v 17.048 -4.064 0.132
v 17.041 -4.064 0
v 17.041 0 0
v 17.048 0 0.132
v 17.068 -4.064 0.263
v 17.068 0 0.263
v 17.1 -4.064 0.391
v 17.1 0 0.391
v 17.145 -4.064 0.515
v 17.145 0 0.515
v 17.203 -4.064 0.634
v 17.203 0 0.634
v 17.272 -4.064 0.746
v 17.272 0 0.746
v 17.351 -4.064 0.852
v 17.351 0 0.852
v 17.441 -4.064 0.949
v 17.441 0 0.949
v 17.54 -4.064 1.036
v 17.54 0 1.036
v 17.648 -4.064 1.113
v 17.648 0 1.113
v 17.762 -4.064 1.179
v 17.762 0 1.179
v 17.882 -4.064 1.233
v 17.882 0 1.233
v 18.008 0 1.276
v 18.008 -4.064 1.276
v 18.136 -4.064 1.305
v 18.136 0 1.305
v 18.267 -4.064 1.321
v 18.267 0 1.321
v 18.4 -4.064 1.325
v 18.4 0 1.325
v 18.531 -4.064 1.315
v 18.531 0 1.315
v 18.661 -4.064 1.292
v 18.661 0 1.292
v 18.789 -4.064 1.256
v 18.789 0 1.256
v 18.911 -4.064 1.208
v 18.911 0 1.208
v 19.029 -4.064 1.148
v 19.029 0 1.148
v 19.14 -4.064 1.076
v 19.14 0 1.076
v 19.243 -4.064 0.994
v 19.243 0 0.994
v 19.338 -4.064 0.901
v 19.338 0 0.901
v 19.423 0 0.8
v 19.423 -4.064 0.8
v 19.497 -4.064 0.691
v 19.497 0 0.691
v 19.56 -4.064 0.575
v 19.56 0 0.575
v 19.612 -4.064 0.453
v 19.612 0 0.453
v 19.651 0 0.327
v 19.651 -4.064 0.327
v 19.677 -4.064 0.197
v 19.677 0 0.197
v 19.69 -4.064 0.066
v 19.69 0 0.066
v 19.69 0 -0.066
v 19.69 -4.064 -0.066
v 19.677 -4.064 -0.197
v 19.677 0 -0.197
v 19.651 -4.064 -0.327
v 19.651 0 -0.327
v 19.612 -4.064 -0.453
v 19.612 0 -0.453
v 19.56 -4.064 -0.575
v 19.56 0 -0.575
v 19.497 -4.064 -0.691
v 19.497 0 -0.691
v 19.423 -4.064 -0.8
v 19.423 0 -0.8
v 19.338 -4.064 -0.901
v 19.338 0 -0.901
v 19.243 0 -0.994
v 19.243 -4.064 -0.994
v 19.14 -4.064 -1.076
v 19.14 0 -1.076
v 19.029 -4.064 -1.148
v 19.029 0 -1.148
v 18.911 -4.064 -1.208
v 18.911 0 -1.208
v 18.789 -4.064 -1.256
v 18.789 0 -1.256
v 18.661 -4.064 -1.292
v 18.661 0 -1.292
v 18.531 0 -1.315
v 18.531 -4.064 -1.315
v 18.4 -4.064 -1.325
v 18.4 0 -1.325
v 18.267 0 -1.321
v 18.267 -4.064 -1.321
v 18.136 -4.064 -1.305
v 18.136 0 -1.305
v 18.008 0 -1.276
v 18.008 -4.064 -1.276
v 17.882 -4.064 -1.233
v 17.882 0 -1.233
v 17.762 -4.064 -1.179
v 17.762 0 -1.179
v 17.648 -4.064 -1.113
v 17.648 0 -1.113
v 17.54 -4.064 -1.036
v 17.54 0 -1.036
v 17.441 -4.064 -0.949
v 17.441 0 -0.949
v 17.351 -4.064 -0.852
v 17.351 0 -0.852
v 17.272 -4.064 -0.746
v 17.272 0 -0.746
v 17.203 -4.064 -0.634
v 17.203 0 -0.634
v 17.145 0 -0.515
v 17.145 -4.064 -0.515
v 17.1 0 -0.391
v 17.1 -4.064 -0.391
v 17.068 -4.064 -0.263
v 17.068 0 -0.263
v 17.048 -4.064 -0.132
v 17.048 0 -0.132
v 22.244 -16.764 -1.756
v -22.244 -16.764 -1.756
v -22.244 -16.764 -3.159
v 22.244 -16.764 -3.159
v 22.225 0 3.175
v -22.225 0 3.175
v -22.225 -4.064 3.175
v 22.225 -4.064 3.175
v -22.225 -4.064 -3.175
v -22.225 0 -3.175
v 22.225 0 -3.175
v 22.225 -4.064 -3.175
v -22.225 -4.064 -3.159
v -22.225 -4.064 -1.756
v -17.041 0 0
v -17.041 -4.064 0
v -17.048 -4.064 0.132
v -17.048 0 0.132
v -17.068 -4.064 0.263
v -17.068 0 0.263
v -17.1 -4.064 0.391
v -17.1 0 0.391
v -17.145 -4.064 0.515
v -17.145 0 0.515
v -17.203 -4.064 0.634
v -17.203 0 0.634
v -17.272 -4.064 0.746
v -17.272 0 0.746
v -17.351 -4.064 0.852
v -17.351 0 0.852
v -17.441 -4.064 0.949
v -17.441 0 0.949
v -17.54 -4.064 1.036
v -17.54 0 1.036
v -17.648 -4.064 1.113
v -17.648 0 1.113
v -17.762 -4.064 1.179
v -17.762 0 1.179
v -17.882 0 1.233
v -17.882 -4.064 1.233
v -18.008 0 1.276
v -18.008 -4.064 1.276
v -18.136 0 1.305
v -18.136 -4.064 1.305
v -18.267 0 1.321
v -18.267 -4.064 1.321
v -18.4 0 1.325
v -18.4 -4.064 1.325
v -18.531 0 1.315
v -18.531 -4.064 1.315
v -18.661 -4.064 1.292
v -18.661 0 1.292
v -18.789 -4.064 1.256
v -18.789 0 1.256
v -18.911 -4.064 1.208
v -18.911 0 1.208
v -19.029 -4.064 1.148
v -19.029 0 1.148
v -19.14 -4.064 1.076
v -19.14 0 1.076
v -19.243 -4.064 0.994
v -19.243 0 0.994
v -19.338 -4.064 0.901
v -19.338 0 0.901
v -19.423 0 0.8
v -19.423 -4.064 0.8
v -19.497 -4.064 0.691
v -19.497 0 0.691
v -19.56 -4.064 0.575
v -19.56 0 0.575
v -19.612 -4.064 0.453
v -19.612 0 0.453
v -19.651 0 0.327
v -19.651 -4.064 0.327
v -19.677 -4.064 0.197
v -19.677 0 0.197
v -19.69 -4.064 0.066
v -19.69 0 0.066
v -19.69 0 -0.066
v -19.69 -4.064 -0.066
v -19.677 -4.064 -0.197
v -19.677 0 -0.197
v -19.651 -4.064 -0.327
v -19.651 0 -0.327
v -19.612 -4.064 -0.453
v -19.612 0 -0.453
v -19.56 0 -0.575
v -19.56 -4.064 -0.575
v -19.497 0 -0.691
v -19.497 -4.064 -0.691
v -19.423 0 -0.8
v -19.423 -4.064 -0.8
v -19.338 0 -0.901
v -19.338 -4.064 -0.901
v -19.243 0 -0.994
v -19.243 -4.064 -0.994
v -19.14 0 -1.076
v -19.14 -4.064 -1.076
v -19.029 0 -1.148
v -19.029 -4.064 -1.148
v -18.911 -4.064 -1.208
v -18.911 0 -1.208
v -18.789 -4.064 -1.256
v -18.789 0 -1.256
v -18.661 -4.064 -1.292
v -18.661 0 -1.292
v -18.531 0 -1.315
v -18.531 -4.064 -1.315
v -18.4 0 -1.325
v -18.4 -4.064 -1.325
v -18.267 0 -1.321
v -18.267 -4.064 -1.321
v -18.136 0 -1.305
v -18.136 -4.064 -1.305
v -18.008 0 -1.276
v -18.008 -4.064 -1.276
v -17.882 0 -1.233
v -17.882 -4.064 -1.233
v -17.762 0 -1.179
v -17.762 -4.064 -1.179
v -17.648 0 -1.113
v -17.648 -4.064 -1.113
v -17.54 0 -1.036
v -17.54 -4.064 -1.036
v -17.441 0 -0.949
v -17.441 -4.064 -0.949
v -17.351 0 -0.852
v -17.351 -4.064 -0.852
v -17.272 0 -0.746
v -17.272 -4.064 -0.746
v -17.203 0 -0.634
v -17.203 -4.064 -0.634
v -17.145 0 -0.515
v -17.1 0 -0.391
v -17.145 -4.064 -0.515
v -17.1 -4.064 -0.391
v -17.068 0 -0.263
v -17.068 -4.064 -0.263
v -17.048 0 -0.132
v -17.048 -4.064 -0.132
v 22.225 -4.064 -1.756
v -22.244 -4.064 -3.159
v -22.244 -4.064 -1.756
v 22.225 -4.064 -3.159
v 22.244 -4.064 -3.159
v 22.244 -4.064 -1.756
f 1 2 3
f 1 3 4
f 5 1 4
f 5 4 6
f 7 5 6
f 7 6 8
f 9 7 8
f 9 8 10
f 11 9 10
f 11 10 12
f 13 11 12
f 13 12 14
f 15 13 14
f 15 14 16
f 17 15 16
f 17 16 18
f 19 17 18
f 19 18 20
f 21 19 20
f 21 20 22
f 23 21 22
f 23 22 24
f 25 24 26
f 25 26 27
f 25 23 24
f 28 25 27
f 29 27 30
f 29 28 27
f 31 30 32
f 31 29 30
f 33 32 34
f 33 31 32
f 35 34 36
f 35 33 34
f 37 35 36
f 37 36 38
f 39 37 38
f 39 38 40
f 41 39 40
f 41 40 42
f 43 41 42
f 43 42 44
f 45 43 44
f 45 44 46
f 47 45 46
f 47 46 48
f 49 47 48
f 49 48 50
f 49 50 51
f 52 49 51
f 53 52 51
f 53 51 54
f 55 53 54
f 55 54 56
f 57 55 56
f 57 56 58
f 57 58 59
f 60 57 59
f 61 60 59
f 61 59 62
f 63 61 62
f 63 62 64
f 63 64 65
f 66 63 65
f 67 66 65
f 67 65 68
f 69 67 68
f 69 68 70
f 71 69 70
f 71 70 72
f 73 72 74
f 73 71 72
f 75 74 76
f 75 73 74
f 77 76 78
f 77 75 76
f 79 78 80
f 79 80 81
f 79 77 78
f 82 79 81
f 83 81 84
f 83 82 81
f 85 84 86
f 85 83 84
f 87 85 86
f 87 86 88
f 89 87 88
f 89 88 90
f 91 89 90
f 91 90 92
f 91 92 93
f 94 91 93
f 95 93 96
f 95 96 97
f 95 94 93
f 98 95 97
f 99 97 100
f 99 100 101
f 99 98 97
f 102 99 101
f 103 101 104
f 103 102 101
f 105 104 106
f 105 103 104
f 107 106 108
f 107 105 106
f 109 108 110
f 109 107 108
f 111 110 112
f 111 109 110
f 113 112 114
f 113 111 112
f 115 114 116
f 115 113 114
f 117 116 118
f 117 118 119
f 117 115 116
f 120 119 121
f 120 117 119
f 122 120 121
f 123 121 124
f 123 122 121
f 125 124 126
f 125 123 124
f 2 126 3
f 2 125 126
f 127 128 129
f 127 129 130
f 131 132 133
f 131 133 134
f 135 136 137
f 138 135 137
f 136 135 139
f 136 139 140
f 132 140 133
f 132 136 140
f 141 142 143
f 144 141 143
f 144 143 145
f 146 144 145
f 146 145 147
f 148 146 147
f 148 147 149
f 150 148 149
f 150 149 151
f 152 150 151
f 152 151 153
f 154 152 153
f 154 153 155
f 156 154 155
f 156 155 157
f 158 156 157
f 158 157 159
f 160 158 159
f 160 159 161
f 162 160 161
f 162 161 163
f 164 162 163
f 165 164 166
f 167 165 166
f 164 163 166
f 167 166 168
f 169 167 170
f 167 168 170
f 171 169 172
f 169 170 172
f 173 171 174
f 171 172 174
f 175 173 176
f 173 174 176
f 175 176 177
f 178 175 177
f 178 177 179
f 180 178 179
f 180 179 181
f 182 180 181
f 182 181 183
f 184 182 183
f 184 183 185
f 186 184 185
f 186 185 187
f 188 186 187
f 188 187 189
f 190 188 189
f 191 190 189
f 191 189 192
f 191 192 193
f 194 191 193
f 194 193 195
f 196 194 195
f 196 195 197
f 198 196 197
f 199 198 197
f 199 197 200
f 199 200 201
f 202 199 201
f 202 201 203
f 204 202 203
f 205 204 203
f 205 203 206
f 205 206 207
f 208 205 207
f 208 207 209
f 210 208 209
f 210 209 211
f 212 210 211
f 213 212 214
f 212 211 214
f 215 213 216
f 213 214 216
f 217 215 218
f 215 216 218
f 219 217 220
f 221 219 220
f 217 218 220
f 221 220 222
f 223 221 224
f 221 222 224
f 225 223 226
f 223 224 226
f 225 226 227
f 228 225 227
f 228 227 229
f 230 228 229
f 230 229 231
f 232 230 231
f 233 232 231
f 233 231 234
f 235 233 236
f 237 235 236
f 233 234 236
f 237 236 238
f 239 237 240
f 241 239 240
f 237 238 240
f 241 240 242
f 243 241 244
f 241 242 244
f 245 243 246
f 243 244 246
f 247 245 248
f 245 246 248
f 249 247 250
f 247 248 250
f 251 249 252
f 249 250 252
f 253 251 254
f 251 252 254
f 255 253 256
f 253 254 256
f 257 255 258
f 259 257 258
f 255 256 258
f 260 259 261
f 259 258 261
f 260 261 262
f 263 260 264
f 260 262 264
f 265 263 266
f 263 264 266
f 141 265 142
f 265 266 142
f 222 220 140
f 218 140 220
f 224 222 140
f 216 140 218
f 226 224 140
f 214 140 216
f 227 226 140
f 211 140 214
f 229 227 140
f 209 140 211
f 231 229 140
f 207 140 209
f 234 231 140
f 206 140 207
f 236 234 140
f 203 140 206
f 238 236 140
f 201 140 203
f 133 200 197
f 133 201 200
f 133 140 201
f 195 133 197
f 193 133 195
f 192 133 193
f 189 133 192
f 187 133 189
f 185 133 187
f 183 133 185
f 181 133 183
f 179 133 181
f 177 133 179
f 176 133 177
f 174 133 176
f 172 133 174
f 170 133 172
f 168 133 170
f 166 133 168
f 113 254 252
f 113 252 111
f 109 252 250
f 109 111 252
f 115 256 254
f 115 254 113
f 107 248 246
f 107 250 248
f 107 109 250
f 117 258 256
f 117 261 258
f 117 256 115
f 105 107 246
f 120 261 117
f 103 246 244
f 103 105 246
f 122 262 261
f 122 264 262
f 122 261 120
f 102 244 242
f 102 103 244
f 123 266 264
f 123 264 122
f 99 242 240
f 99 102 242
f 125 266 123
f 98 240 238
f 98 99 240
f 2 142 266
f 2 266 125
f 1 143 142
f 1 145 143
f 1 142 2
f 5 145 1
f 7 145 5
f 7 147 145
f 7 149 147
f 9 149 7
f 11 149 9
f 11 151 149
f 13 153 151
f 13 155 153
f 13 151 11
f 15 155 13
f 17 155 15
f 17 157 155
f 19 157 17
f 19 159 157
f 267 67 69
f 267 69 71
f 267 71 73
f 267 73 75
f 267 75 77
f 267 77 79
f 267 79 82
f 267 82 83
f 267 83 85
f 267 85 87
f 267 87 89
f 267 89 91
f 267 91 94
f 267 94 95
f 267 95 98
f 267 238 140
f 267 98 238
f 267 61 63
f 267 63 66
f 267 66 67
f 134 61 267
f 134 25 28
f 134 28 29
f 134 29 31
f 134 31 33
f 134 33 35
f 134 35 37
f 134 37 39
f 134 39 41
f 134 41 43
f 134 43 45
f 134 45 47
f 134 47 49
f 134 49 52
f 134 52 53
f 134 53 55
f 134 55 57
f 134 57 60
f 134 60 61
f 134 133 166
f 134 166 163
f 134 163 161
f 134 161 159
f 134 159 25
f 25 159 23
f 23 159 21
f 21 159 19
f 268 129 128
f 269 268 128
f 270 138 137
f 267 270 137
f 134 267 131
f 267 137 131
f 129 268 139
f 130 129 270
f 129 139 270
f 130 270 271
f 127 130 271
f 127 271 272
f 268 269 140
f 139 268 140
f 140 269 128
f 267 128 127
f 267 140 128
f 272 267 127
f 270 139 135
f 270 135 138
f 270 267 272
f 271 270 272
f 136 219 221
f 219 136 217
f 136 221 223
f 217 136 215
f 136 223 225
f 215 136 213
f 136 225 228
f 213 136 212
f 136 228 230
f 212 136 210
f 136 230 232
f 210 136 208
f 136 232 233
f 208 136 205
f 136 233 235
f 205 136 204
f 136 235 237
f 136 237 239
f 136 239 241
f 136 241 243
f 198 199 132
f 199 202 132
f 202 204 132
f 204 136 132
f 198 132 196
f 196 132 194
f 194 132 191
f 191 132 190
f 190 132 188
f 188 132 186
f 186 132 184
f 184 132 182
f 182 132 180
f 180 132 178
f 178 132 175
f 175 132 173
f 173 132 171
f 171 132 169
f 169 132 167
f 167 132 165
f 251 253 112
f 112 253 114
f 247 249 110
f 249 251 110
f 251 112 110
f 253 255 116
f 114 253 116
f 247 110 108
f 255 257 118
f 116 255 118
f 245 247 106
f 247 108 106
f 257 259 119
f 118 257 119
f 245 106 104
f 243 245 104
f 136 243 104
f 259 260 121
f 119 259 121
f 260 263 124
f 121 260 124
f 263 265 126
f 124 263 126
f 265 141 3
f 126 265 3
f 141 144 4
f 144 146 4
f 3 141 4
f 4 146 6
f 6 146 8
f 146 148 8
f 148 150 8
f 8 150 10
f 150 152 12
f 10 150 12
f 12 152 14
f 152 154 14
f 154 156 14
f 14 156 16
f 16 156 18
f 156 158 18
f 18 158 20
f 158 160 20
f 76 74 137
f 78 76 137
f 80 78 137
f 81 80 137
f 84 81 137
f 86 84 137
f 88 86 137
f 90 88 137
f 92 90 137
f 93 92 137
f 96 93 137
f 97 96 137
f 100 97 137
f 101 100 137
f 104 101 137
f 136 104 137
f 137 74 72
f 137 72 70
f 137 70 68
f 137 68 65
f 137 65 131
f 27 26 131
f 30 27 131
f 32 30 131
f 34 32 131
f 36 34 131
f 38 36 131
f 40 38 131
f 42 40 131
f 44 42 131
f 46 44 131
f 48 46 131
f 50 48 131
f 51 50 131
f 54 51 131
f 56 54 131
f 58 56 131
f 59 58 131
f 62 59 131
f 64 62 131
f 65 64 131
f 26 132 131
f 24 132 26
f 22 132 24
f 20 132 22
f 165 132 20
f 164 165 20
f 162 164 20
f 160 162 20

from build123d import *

# Parameters (mm, degrees)
F0_W     = 44.45
F0_H     = 6.35
F1_DEPTH = 4.064
F2_R     = 1.325099
F3_DEPTH = 25.4
F5_DEPTH = 25.4
F7_W     = 44.487826
F7_H     = 1.40328
F8_DEPTH = 12.7


with BuildPart() as f1:
    # F0 (on Front) → F1 (new body)
    with BuildSketch(Plane.XZ):
        Rectangle(F0_W, F0_H)
    extrude(amount=F1_DEPTH)

    # F2 (on face) → F3 (cut)
    with BuildSketch(Plane.XZ.offset(4.064)):
        with Locations((-18.36648, 0)):
            Circle(F2_R)
    extrude(amount=-F3_DEPTH, mode=Mode.SUBTRACT)

    # F2 (on face) → F5 (cut)
    with BuildSketch(Plane.XZ.offset(4.064)):
        with Locations((-18.36648, 0)):
            Circle(F2_R)
    extrude(amount=-F5_DEPTH, mode=Mode.SUBTRACT)

    # F6: F1 across plane


with BuildPart() as f1_1:
    add(f1.part)
    add(f1.part.mirror(Plane.YZ), mode=Mode.INTERSECT)

    # F7 (on face) → F8 (join)
    with BuildSketch(Plane.XZ.offset(4.064)):
        with Locations((0, -2.45779)):
            Rectangle(F7_W, F7_H)
    extrude(amount=F8_DEPTH)


solid = f1_1.part
